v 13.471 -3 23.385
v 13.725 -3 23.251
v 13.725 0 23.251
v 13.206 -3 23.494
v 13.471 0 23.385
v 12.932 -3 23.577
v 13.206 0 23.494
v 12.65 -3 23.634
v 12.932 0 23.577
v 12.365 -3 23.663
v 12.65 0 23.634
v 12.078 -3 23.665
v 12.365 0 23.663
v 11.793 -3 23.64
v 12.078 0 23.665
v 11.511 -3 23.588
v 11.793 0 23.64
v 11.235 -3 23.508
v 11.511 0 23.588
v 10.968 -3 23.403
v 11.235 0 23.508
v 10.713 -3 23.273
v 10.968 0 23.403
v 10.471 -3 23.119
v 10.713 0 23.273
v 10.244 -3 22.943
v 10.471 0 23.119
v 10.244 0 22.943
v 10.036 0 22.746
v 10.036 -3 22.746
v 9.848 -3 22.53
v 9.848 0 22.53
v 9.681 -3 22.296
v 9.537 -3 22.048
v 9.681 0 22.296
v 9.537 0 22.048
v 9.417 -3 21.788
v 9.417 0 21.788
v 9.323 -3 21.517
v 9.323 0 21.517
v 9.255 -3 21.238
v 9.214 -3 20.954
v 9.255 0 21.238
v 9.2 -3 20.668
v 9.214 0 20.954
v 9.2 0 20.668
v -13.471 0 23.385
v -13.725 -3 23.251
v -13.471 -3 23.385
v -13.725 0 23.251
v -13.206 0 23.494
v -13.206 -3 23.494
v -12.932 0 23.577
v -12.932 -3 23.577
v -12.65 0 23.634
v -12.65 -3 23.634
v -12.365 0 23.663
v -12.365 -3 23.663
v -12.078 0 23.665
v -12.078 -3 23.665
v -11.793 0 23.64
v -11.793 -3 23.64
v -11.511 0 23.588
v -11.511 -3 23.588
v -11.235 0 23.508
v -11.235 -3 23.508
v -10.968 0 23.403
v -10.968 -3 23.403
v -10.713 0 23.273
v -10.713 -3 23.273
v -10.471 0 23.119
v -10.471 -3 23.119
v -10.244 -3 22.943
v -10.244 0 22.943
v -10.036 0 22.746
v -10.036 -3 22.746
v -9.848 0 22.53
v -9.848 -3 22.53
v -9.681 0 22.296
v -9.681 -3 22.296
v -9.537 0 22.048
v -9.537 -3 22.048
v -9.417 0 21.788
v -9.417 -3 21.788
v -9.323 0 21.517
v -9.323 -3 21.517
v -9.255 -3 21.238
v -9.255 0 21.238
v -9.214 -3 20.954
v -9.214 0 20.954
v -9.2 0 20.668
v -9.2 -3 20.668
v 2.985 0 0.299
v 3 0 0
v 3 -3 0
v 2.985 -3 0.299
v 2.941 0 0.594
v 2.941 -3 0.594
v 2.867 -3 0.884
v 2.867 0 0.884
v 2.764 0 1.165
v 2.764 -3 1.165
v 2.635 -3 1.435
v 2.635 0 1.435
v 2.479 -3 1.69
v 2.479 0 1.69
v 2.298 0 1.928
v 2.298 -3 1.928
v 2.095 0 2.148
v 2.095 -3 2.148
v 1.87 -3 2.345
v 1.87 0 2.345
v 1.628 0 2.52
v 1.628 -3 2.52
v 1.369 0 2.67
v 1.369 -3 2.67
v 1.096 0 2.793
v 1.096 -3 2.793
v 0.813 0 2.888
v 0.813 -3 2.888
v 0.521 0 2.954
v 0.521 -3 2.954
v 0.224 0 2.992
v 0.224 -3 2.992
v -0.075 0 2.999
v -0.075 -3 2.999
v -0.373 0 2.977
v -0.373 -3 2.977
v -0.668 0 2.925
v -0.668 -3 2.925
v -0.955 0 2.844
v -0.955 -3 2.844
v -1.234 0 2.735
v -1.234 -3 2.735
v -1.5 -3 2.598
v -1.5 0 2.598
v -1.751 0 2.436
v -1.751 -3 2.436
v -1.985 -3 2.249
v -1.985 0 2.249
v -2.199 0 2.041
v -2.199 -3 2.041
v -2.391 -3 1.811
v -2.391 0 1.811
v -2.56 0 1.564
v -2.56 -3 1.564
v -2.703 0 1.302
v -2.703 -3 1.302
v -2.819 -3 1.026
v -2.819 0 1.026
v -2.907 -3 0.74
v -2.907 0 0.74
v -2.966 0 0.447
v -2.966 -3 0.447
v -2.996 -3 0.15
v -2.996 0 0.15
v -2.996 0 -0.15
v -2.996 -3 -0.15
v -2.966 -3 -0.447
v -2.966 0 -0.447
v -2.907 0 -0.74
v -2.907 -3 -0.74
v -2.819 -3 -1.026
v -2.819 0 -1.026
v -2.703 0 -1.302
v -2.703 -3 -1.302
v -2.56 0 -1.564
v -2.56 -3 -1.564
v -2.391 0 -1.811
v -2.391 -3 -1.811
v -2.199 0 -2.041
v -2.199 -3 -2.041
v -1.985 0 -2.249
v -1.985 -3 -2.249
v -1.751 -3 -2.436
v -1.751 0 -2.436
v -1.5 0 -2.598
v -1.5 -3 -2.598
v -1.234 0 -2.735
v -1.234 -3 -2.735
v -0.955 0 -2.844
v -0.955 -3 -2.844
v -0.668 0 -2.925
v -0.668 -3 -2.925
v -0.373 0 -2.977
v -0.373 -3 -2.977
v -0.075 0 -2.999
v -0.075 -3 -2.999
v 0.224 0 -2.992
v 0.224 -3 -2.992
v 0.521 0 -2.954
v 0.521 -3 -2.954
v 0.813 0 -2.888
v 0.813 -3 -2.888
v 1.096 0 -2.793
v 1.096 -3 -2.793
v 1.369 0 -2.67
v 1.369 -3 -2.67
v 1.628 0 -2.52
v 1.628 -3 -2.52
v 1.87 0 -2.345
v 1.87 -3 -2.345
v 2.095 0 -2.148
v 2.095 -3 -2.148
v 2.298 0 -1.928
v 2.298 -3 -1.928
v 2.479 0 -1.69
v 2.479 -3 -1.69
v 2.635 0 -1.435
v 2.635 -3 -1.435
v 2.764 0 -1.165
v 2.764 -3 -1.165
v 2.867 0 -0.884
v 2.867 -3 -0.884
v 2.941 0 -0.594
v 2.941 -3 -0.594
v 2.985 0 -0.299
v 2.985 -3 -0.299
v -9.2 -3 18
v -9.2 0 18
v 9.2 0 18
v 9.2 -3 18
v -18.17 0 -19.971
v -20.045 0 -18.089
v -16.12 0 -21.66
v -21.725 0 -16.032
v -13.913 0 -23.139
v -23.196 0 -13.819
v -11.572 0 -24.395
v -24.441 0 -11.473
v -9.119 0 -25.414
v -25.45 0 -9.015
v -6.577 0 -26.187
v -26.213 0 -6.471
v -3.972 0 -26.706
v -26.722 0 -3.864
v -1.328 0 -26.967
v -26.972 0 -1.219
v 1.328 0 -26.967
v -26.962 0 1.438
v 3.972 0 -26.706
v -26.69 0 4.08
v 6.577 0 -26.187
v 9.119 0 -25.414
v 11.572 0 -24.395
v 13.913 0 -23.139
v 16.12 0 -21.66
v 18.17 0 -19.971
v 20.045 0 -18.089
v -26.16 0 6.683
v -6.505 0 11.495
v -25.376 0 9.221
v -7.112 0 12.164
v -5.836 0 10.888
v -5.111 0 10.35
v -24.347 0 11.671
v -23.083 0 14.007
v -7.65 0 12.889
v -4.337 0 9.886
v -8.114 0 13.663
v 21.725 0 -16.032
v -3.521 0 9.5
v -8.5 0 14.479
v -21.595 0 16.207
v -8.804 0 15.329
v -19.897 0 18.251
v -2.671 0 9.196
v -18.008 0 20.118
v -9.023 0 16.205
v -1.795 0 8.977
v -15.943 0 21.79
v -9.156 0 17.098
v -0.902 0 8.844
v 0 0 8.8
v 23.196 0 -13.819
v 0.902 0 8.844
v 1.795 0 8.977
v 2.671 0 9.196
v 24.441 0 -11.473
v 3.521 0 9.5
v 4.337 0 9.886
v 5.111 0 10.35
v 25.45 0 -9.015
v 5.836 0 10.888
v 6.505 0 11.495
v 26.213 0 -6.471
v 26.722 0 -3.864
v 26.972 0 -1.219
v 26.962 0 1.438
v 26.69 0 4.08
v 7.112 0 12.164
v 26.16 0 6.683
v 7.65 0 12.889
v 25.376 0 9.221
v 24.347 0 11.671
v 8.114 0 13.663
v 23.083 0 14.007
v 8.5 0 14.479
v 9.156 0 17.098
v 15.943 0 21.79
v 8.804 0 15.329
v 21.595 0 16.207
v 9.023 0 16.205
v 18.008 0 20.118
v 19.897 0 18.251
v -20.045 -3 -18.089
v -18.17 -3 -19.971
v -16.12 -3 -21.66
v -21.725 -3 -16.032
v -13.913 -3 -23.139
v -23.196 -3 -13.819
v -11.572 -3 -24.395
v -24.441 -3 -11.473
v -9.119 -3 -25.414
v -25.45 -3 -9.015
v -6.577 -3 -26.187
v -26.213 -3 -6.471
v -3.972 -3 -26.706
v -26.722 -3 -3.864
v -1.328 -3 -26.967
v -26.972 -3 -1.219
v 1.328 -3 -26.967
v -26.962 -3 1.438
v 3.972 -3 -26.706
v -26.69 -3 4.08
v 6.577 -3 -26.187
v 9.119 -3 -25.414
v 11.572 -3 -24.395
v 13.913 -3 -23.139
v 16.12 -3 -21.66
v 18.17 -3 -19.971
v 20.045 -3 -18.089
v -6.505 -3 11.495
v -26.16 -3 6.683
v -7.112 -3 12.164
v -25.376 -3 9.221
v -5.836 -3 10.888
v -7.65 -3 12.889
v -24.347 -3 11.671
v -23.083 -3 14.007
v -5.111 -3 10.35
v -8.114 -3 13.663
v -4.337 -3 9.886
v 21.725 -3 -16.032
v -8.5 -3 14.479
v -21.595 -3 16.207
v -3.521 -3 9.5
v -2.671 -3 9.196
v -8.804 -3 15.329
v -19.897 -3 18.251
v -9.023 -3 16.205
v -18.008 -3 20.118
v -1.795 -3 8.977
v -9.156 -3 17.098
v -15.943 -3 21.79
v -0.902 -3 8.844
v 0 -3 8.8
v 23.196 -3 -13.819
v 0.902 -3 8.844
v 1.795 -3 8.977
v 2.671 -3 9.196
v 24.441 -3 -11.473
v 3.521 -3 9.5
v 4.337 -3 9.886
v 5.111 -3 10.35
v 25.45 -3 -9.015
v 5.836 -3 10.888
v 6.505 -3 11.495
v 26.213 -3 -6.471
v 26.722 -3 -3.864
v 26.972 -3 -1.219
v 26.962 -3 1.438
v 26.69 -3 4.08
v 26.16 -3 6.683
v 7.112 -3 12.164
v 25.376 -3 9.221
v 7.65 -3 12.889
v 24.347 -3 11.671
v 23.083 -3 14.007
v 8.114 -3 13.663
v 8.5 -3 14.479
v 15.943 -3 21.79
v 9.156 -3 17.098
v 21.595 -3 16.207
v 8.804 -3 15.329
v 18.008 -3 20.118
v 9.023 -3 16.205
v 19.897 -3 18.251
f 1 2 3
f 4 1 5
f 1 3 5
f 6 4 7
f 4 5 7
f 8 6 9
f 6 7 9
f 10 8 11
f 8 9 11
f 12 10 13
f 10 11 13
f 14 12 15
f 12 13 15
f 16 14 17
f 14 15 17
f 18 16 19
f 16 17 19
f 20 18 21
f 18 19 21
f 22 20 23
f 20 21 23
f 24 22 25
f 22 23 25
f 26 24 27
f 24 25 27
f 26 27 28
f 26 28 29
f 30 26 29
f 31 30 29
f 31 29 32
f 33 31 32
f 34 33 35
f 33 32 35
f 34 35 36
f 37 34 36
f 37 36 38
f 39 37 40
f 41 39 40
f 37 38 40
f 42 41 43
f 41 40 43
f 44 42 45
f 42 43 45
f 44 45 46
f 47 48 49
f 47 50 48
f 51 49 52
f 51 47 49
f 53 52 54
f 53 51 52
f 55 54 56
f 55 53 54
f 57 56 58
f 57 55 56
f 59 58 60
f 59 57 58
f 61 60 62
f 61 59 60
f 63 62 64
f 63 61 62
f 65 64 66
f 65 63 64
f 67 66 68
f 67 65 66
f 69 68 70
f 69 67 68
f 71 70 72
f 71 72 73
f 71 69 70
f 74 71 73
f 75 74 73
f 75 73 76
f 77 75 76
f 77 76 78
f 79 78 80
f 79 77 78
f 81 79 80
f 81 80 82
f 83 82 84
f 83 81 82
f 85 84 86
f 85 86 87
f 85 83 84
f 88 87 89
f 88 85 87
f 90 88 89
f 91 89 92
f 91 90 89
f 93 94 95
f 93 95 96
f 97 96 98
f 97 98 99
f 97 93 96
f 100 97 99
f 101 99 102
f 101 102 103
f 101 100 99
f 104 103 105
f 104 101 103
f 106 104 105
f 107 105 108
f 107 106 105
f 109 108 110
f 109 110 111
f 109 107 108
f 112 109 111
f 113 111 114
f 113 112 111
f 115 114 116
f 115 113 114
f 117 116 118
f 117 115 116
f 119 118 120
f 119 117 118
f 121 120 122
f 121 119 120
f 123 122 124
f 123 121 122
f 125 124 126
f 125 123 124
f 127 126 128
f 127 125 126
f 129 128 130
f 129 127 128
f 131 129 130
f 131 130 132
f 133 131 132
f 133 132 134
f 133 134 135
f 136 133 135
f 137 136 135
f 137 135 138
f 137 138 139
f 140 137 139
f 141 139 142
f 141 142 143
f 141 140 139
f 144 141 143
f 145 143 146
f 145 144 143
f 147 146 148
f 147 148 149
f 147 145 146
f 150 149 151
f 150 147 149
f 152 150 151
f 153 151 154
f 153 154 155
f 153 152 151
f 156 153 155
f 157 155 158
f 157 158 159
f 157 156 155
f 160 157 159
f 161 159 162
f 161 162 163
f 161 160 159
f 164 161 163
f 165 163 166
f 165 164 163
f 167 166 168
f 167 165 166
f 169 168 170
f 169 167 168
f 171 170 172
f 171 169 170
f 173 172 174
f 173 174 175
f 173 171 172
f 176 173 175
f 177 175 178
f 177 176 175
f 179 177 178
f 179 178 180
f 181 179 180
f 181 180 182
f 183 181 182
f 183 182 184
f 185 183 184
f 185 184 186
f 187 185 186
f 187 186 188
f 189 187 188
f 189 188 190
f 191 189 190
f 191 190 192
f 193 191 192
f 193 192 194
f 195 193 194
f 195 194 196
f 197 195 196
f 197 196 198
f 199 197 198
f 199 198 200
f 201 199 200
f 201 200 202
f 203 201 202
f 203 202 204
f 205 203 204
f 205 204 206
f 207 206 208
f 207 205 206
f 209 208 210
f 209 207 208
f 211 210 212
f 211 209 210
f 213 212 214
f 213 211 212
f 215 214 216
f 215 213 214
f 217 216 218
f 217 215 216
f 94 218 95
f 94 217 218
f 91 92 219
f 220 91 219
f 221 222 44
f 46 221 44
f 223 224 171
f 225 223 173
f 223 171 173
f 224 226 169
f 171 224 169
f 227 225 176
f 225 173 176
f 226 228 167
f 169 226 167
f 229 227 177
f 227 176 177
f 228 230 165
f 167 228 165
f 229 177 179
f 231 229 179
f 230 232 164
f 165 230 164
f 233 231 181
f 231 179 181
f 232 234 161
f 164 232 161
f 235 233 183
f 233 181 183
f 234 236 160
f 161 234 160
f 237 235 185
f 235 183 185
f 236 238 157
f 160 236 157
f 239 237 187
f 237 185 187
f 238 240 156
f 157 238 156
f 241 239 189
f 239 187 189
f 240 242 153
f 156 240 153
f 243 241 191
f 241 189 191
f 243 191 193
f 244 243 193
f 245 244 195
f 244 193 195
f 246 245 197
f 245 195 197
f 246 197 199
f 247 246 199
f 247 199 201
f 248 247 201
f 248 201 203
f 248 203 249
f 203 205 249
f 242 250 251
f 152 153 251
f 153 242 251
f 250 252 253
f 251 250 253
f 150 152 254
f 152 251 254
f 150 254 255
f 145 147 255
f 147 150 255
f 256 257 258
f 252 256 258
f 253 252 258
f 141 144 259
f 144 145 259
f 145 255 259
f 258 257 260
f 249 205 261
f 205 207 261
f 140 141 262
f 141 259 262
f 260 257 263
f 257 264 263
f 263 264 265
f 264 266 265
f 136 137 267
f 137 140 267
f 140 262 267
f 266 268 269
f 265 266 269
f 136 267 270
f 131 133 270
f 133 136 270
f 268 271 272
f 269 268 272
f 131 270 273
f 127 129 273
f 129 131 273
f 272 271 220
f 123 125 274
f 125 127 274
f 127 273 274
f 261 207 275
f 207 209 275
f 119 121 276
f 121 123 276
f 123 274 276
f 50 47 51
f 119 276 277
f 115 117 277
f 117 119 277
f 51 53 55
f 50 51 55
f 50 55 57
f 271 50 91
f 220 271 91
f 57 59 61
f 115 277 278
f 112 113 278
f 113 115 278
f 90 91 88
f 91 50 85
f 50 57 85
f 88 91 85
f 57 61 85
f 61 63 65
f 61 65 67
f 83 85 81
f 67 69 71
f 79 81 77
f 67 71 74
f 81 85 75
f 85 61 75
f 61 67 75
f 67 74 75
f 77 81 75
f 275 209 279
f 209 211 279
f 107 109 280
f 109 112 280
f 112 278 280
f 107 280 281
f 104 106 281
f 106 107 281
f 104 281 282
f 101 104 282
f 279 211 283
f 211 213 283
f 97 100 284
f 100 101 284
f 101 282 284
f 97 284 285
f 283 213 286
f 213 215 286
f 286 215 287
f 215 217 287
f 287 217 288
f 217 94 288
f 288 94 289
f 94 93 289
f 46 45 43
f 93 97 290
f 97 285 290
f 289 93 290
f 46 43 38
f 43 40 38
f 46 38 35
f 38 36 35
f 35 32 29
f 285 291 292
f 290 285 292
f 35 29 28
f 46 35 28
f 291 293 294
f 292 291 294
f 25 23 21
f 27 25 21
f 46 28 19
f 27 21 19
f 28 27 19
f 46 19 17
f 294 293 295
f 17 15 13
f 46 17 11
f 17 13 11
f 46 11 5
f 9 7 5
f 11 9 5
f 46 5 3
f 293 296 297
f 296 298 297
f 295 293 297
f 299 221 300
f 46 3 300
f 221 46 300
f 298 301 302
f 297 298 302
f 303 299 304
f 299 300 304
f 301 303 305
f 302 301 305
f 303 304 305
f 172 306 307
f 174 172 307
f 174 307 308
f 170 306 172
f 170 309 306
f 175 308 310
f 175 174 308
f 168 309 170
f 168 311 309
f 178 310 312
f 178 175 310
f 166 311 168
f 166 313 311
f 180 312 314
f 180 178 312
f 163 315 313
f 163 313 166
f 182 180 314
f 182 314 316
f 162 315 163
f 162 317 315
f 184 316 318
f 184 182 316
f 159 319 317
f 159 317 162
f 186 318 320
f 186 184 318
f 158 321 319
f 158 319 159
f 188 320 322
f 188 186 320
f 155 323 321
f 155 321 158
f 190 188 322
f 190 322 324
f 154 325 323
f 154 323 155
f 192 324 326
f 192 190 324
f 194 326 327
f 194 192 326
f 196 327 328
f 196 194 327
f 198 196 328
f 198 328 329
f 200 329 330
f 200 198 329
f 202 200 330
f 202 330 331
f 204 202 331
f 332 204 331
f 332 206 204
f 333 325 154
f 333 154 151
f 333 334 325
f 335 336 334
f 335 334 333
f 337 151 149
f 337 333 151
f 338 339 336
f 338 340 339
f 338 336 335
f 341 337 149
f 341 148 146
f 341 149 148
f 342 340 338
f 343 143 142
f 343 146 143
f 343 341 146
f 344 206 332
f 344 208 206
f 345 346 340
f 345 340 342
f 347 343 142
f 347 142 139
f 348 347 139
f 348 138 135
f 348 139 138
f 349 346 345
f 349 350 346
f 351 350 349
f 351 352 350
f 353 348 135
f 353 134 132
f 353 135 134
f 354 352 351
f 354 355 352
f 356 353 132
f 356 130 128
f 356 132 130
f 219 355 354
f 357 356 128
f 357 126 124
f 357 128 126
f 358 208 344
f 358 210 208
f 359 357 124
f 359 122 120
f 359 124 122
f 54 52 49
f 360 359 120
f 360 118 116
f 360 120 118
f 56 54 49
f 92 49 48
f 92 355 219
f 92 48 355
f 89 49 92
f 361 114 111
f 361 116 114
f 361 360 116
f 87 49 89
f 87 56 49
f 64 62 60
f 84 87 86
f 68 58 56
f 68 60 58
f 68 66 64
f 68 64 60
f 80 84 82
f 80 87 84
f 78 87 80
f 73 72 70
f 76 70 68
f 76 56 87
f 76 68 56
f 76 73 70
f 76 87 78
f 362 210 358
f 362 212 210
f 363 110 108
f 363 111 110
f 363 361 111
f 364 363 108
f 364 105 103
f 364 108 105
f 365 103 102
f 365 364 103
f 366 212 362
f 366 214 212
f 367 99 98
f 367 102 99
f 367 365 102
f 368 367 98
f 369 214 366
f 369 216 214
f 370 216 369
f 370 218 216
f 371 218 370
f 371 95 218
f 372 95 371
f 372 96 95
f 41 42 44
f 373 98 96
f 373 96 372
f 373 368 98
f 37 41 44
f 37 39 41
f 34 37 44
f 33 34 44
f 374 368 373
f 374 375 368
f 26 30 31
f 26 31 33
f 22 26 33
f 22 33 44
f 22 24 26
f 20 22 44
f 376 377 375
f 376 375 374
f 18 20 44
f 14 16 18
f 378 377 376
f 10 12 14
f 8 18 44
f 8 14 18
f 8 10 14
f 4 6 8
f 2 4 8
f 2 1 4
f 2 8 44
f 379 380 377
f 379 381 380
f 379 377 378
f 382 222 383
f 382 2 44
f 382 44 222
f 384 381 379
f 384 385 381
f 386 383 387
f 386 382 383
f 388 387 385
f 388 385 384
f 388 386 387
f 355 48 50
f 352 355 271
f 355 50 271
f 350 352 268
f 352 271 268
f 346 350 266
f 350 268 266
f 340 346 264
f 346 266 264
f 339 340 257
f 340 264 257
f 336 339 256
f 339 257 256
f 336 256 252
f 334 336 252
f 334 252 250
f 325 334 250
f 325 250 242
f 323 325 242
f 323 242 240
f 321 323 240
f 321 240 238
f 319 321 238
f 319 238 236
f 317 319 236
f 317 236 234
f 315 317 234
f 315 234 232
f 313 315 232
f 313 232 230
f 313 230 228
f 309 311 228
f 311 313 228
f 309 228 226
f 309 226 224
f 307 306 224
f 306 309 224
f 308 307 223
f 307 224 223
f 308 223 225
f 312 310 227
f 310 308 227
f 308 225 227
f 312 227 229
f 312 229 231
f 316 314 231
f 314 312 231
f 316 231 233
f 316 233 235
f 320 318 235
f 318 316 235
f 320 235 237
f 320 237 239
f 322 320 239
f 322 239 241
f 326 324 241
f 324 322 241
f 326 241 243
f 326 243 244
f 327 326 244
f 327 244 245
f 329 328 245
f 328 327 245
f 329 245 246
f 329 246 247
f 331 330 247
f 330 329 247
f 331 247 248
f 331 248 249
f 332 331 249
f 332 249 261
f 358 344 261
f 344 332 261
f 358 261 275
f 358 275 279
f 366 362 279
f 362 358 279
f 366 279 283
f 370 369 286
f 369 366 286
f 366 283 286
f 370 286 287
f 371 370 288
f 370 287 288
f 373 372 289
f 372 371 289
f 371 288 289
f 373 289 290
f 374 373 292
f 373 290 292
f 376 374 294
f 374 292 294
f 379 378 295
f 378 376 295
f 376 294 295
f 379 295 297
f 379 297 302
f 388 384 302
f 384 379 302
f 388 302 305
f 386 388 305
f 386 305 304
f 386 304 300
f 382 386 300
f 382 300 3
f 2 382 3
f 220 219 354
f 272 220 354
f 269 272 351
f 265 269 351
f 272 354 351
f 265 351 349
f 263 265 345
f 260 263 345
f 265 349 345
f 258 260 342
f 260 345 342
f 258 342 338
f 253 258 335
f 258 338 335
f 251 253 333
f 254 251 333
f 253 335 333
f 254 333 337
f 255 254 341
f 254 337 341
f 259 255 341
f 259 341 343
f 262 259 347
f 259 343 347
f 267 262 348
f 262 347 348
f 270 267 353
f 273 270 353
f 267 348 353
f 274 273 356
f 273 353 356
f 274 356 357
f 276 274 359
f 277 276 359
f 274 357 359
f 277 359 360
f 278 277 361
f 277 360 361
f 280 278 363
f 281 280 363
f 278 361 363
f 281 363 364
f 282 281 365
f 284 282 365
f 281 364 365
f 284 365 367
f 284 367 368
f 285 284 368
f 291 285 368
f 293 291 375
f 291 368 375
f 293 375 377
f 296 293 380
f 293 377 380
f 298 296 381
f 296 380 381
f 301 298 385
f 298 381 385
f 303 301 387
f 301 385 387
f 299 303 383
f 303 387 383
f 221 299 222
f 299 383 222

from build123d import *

# Parameters (mm, degrees)
F0_R     = 27
F0_R_2   = 3
F1_DEPTH = 3
F3_DEPTH = 3
F4_R     = 3


# Not quite as in the source:
# - a feature names something its author has since deleted; it is built from what else it names


with BuildPart() as f1:
    # F0 (on Front) → F1 (new body)
    with BuildSketch(Plane.XZ):
        Circle(F0_R)
        Circle(F0_R_2, mode=Mode.SUBTRACT)
    extrude(amount=F1_DEPTH)

    # F2 (on face) → F3 (cut)
    with BuildSketch(Plane.XZ.offset(3)):
        with BuildLine():
            Line((-9.2, 30.5910954097), (-9.2, 18))
            ThreePointArc((-9.2, 18), (0, 8.8), (9.2, 18))
            Line((9.2, 18), (9.2, 30.5910954097))
            Line((9.2, 30.5910954097), (-9.2, 30.5910954097))
        make_face()
    extrude(amount=-F3_DEPTH, mode=Mode.SUBTRACT)

    # F4
    f4_edges = [f1.edges().sort_by_distance(p)[0] for p in [
        (-9.2, -1.5, 25.384247),
        (9.2, -1.5, 25.384247),
    ]]
    fillet(f4_edges, radius=F4_R)


solid = f1.part
